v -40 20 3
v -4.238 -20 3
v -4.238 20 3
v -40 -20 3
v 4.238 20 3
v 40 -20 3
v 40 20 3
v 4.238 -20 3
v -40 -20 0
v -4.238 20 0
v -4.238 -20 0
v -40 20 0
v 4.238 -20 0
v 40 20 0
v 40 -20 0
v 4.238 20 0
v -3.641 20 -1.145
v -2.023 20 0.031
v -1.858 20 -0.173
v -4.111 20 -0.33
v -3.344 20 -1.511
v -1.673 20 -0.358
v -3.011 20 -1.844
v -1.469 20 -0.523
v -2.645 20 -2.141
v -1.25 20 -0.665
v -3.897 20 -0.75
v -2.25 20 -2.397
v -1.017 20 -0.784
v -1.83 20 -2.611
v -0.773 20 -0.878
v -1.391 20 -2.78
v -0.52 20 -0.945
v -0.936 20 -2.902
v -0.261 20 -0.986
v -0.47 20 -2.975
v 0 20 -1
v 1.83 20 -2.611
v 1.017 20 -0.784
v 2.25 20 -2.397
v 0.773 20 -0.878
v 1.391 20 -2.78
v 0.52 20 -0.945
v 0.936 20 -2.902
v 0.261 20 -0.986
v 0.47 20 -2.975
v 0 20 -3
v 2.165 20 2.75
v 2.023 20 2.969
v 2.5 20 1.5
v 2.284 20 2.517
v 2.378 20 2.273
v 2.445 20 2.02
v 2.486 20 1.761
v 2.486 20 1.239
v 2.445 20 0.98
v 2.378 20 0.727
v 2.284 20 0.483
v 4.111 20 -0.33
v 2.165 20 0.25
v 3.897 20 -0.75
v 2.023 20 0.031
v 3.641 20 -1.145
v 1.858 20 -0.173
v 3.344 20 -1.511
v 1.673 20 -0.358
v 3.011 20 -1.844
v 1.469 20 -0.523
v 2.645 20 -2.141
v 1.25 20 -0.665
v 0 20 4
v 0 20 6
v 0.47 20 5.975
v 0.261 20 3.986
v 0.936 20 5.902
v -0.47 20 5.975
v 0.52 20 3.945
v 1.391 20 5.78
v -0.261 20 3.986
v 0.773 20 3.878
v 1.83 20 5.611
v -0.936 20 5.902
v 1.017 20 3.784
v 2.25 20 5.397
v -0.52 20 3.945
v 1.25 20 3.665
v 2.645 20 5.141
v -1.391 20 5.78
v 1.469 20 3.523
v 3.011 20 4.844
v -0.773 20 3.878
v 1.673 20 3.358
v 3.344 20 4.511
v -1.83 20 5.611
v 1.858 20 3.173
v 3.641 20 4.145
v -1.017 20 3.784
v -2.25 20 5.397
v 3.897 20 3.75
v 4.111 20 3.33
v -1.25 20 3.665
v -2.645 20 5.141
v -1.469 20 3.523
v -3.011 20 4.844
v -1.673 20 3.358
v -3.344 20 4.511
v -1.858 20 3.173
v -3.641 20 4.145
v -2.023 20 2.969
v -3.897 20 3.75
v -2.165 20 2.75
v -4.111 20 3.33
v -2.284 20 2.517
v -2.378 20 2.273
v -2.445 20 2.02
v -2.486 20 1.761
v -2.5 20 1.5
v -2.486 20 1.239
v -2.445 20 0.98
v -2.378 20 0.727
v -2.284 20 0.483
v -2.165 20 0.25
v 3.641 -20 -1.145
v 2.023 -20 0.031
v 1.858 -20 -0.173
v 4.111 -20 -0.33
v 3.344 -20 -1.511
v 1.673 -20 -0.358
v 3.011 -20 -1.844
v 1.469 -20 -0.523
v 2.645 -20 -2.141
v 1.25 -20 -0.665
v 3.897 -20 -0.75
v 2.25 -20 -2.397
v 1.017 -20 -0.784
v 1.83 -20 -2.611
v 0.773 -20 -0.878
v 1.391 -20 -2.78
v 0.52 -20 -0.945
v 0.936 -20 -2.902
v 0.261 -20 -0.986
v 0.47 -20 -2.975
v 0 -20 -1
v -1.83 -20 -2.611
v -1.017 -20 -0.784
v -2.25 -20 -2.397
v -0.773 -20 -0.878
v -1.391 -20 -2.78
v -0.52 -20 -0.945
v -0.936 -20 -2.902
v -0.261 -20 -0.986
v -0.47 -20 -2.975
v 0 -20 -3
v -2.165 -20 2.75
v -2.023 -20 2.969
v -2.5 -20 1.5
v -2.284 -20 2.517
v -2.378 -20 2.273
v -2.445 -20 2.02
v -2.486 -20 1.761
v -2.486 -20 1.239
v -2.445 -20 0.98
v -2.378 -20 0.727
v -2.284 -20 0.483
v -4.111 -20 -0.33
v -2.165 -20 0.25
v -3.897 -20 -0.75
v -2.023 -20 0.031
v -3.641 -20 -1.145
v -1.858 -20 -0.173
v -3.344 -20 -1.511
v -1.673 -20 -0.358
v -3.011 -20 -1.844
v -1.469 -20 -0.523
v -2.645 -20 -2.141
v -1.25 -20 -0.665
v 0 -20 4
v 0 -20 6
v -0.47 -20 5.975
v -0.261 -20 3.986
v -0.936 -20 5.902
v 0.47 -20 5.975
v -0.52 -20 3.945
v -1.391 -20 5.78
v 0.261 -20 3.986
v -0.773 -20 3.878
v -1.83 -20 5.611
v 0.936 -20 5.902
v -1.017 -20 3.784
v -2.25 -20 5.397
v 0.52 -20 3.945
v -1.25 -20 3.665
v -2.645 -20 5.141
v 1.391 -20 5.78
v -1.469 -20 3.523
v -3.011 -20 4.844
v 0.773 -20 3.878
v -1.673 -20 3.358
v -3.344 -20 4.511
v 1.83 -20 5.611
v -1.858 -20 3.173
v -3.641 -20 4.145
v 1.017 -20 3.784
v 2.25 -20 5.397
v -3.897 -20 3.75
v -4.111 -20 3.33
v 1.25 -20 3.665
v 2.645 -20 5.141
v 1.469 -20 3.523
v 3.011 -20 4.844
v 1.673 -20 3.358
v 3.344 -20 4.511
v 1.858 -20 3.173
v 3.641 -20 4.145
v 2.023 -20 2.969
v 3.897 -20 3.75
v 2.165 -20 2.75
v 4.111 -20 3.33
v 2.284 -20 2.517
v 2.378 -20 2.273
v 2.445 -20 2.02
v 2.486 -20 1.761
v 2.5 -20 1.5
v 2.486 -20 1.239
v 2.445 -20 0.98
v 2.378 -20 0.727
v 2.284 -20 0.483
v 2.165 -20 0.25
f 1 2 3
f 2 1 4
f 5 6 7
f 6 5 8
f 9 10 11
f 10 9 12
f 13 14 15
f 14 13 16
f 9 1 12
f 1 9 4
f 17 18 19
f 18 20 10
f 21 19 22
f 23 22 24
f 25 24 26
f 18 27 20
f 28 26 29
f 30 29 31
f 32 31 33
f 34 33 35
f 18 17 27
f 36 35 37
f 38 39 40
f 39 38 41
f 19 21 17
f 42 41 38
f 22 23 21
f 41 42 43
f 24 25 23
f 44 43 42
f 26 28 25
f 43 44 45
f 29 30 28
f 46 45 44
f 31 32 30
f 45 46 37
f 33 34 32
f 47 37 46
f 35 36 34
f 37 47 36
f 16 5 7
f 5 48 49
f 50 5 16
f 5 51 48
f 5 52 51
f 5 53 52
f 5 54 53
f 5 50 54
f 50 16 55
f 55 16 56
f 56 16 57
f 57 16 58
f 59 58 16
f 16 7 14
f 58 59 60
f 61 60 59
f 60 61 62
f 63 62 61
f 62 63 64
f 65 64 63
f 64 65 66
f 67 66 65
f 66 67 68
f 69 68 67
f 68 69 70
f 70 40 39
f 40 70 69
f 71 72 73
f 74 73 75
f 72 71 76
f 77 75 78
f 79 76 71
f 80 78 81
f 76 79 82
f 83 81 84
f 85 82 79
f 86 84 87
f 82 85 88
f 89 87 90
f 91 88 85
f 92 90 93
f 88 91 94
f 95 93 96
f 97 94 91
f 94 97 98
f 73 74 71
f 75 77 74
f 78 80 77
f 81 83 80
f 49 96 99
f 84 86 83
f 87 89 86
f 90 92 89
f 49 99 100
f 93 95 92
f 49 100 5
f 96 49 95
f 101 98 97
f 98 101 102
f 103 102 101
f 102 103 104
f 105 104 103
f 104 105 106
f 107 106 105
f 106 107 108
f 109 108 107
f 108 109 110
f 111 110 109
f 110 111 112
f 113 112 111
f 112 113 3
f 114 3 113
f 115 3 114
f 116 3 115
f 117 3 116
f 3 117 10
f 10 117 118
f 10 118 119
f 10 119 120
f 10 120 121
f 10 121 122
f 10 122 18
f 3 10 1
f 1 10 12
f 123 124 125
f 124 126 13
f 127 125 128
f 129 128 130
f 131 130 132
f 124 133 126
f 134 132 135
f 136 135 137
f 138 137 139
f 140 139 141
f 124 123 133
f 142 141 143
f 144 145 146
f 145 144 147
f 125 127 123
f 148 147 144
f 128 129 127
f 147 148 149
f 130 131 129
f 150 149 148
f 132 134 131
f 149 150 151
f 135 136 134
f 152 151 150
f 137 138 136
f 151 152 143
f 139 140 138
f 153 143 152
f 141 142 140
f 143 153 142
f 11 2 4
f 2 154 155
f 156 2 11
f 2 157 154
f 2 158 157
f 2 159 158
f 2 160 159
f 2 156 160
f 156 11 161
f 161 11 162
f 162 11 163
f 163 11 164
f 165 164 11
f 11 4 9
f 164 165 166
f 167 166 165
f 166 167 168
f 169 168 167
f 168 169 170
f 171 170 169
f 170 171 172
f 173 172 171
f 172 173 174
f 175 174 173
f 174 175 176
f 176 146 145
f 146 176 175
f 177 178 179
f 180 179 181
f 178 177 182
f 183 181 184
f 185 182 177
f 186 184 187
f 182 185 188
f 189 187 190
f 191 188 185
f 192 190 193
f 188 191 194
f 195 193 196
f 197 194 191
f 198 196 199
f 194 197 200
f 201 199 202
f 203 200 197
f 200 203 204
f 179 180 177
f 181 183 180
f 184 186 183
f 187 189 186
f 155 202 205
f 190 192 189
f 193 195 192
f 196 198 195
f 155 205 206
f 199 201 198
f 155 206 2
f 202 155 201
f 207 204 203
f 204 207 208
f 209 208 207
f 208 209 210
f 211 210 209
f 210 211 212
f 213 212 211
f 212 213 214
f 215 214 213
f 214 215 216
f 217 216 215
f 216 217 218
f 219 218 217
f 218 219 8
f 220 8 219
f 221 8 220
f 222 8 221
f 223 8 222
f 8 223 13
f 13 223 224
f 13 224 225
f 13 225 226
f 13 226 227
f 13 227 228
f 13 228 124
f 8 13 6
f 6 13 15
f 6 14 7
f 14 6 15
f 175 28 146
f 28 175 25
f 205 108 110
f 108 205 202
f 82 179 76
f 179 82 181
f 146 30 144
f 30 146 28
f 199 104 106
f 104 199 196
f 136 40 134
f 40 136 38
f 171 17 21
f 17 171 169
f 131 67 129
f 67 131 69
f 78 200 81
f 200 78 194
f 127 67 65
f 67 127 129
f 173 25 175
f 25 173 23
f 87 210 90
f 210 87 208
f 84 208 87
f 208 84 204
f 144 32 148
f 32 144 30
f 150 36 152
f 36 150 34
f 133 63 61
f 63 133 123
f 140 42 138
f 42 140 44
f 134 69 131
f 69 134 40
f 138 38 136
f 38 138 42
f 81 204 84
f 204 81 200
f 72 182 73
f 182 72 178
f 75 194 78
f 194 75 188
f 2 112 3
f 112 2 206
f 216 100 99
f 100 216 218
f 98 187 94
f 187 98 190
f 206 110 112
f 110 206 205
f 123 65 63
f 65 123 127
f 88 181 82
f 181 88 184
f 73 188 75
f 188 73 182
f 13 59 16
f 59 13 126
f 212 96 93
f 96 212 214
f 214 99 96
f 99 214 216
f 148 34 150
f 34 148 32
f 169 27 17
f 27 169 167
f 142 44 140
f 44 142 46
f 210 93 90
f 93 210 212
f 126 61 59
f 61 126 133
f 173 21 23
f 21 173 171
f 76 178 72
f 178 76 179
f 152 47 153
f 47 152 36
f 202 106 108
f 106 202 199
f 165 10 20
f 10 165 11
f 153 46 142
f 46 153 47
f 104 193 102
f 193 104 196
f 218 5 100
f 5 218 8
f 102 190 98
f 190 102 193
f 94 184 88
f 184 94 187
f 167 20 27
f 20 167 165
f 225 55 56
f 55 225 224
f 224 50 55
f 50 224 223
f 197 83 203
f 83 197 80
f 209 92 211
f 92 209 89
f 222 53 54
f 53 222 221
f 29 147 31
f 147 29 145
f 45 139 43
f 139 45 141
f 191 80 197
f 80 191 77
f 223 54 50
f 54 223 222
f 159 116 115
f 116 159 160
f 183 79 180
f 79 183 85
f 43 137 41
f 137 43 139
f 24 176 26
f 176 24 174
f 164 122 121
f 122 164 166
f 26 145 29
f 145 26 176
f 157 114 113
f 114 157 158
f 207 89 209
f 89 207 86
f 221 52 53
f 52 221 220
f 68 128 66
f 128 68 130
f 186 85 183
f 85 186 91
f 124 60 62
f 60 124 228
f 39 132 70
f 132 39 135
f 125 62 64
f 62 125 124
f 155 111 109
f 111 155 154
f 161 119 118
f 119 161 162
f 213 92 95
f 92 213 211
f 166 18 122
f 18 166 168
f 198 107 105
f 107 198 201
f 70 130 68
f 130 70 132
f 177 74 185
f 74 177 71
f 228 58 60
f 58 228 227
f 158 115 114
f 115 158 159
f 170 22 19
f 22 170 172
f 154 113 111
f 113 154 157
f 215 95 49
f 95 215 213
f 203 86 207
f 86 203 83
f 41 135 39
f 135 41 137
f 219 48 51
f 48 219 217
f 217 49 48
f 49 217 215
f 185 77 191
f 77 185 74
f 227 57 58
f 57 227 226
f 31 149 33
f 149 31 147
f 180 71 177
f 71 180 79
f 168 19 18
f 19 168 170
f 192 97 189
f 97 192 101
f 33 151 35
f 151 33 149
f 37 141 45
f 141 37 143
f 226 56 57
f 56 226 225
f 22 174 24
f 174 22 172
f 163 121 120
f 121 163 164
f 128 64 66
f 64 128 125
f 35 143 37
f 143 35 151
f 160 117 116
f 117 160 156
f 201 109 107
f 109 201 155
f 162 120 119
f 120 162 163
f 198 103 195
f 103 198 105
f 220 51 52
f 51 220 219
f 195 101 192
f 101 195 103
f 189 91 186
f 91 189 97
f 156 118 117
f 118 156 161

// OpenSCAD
// Compact plate hinge.
$fn = 60;
eps = 0.02;
leaf_l = 40;
width = 40;
pin_d = 5;
leaf_t = 3;
difference() {
    union() {
        translate([-leaf_l,-width/2,0]) cube([leaf_l,width,leaf_t]);
        translate([0,-width/2,0]) cube([leaf_l,width,leaf_t]);
        translate([0,-width/2,leaf_t/2]) rotate([-90,0,0]) cylinder(d=pin_d+4,h=width);
    }
    translate([0,-width/2-eps,leaf_t/2]) rotate([-90,0,0]) cylinder(d=pin_d,h=width+2*eps);
}
